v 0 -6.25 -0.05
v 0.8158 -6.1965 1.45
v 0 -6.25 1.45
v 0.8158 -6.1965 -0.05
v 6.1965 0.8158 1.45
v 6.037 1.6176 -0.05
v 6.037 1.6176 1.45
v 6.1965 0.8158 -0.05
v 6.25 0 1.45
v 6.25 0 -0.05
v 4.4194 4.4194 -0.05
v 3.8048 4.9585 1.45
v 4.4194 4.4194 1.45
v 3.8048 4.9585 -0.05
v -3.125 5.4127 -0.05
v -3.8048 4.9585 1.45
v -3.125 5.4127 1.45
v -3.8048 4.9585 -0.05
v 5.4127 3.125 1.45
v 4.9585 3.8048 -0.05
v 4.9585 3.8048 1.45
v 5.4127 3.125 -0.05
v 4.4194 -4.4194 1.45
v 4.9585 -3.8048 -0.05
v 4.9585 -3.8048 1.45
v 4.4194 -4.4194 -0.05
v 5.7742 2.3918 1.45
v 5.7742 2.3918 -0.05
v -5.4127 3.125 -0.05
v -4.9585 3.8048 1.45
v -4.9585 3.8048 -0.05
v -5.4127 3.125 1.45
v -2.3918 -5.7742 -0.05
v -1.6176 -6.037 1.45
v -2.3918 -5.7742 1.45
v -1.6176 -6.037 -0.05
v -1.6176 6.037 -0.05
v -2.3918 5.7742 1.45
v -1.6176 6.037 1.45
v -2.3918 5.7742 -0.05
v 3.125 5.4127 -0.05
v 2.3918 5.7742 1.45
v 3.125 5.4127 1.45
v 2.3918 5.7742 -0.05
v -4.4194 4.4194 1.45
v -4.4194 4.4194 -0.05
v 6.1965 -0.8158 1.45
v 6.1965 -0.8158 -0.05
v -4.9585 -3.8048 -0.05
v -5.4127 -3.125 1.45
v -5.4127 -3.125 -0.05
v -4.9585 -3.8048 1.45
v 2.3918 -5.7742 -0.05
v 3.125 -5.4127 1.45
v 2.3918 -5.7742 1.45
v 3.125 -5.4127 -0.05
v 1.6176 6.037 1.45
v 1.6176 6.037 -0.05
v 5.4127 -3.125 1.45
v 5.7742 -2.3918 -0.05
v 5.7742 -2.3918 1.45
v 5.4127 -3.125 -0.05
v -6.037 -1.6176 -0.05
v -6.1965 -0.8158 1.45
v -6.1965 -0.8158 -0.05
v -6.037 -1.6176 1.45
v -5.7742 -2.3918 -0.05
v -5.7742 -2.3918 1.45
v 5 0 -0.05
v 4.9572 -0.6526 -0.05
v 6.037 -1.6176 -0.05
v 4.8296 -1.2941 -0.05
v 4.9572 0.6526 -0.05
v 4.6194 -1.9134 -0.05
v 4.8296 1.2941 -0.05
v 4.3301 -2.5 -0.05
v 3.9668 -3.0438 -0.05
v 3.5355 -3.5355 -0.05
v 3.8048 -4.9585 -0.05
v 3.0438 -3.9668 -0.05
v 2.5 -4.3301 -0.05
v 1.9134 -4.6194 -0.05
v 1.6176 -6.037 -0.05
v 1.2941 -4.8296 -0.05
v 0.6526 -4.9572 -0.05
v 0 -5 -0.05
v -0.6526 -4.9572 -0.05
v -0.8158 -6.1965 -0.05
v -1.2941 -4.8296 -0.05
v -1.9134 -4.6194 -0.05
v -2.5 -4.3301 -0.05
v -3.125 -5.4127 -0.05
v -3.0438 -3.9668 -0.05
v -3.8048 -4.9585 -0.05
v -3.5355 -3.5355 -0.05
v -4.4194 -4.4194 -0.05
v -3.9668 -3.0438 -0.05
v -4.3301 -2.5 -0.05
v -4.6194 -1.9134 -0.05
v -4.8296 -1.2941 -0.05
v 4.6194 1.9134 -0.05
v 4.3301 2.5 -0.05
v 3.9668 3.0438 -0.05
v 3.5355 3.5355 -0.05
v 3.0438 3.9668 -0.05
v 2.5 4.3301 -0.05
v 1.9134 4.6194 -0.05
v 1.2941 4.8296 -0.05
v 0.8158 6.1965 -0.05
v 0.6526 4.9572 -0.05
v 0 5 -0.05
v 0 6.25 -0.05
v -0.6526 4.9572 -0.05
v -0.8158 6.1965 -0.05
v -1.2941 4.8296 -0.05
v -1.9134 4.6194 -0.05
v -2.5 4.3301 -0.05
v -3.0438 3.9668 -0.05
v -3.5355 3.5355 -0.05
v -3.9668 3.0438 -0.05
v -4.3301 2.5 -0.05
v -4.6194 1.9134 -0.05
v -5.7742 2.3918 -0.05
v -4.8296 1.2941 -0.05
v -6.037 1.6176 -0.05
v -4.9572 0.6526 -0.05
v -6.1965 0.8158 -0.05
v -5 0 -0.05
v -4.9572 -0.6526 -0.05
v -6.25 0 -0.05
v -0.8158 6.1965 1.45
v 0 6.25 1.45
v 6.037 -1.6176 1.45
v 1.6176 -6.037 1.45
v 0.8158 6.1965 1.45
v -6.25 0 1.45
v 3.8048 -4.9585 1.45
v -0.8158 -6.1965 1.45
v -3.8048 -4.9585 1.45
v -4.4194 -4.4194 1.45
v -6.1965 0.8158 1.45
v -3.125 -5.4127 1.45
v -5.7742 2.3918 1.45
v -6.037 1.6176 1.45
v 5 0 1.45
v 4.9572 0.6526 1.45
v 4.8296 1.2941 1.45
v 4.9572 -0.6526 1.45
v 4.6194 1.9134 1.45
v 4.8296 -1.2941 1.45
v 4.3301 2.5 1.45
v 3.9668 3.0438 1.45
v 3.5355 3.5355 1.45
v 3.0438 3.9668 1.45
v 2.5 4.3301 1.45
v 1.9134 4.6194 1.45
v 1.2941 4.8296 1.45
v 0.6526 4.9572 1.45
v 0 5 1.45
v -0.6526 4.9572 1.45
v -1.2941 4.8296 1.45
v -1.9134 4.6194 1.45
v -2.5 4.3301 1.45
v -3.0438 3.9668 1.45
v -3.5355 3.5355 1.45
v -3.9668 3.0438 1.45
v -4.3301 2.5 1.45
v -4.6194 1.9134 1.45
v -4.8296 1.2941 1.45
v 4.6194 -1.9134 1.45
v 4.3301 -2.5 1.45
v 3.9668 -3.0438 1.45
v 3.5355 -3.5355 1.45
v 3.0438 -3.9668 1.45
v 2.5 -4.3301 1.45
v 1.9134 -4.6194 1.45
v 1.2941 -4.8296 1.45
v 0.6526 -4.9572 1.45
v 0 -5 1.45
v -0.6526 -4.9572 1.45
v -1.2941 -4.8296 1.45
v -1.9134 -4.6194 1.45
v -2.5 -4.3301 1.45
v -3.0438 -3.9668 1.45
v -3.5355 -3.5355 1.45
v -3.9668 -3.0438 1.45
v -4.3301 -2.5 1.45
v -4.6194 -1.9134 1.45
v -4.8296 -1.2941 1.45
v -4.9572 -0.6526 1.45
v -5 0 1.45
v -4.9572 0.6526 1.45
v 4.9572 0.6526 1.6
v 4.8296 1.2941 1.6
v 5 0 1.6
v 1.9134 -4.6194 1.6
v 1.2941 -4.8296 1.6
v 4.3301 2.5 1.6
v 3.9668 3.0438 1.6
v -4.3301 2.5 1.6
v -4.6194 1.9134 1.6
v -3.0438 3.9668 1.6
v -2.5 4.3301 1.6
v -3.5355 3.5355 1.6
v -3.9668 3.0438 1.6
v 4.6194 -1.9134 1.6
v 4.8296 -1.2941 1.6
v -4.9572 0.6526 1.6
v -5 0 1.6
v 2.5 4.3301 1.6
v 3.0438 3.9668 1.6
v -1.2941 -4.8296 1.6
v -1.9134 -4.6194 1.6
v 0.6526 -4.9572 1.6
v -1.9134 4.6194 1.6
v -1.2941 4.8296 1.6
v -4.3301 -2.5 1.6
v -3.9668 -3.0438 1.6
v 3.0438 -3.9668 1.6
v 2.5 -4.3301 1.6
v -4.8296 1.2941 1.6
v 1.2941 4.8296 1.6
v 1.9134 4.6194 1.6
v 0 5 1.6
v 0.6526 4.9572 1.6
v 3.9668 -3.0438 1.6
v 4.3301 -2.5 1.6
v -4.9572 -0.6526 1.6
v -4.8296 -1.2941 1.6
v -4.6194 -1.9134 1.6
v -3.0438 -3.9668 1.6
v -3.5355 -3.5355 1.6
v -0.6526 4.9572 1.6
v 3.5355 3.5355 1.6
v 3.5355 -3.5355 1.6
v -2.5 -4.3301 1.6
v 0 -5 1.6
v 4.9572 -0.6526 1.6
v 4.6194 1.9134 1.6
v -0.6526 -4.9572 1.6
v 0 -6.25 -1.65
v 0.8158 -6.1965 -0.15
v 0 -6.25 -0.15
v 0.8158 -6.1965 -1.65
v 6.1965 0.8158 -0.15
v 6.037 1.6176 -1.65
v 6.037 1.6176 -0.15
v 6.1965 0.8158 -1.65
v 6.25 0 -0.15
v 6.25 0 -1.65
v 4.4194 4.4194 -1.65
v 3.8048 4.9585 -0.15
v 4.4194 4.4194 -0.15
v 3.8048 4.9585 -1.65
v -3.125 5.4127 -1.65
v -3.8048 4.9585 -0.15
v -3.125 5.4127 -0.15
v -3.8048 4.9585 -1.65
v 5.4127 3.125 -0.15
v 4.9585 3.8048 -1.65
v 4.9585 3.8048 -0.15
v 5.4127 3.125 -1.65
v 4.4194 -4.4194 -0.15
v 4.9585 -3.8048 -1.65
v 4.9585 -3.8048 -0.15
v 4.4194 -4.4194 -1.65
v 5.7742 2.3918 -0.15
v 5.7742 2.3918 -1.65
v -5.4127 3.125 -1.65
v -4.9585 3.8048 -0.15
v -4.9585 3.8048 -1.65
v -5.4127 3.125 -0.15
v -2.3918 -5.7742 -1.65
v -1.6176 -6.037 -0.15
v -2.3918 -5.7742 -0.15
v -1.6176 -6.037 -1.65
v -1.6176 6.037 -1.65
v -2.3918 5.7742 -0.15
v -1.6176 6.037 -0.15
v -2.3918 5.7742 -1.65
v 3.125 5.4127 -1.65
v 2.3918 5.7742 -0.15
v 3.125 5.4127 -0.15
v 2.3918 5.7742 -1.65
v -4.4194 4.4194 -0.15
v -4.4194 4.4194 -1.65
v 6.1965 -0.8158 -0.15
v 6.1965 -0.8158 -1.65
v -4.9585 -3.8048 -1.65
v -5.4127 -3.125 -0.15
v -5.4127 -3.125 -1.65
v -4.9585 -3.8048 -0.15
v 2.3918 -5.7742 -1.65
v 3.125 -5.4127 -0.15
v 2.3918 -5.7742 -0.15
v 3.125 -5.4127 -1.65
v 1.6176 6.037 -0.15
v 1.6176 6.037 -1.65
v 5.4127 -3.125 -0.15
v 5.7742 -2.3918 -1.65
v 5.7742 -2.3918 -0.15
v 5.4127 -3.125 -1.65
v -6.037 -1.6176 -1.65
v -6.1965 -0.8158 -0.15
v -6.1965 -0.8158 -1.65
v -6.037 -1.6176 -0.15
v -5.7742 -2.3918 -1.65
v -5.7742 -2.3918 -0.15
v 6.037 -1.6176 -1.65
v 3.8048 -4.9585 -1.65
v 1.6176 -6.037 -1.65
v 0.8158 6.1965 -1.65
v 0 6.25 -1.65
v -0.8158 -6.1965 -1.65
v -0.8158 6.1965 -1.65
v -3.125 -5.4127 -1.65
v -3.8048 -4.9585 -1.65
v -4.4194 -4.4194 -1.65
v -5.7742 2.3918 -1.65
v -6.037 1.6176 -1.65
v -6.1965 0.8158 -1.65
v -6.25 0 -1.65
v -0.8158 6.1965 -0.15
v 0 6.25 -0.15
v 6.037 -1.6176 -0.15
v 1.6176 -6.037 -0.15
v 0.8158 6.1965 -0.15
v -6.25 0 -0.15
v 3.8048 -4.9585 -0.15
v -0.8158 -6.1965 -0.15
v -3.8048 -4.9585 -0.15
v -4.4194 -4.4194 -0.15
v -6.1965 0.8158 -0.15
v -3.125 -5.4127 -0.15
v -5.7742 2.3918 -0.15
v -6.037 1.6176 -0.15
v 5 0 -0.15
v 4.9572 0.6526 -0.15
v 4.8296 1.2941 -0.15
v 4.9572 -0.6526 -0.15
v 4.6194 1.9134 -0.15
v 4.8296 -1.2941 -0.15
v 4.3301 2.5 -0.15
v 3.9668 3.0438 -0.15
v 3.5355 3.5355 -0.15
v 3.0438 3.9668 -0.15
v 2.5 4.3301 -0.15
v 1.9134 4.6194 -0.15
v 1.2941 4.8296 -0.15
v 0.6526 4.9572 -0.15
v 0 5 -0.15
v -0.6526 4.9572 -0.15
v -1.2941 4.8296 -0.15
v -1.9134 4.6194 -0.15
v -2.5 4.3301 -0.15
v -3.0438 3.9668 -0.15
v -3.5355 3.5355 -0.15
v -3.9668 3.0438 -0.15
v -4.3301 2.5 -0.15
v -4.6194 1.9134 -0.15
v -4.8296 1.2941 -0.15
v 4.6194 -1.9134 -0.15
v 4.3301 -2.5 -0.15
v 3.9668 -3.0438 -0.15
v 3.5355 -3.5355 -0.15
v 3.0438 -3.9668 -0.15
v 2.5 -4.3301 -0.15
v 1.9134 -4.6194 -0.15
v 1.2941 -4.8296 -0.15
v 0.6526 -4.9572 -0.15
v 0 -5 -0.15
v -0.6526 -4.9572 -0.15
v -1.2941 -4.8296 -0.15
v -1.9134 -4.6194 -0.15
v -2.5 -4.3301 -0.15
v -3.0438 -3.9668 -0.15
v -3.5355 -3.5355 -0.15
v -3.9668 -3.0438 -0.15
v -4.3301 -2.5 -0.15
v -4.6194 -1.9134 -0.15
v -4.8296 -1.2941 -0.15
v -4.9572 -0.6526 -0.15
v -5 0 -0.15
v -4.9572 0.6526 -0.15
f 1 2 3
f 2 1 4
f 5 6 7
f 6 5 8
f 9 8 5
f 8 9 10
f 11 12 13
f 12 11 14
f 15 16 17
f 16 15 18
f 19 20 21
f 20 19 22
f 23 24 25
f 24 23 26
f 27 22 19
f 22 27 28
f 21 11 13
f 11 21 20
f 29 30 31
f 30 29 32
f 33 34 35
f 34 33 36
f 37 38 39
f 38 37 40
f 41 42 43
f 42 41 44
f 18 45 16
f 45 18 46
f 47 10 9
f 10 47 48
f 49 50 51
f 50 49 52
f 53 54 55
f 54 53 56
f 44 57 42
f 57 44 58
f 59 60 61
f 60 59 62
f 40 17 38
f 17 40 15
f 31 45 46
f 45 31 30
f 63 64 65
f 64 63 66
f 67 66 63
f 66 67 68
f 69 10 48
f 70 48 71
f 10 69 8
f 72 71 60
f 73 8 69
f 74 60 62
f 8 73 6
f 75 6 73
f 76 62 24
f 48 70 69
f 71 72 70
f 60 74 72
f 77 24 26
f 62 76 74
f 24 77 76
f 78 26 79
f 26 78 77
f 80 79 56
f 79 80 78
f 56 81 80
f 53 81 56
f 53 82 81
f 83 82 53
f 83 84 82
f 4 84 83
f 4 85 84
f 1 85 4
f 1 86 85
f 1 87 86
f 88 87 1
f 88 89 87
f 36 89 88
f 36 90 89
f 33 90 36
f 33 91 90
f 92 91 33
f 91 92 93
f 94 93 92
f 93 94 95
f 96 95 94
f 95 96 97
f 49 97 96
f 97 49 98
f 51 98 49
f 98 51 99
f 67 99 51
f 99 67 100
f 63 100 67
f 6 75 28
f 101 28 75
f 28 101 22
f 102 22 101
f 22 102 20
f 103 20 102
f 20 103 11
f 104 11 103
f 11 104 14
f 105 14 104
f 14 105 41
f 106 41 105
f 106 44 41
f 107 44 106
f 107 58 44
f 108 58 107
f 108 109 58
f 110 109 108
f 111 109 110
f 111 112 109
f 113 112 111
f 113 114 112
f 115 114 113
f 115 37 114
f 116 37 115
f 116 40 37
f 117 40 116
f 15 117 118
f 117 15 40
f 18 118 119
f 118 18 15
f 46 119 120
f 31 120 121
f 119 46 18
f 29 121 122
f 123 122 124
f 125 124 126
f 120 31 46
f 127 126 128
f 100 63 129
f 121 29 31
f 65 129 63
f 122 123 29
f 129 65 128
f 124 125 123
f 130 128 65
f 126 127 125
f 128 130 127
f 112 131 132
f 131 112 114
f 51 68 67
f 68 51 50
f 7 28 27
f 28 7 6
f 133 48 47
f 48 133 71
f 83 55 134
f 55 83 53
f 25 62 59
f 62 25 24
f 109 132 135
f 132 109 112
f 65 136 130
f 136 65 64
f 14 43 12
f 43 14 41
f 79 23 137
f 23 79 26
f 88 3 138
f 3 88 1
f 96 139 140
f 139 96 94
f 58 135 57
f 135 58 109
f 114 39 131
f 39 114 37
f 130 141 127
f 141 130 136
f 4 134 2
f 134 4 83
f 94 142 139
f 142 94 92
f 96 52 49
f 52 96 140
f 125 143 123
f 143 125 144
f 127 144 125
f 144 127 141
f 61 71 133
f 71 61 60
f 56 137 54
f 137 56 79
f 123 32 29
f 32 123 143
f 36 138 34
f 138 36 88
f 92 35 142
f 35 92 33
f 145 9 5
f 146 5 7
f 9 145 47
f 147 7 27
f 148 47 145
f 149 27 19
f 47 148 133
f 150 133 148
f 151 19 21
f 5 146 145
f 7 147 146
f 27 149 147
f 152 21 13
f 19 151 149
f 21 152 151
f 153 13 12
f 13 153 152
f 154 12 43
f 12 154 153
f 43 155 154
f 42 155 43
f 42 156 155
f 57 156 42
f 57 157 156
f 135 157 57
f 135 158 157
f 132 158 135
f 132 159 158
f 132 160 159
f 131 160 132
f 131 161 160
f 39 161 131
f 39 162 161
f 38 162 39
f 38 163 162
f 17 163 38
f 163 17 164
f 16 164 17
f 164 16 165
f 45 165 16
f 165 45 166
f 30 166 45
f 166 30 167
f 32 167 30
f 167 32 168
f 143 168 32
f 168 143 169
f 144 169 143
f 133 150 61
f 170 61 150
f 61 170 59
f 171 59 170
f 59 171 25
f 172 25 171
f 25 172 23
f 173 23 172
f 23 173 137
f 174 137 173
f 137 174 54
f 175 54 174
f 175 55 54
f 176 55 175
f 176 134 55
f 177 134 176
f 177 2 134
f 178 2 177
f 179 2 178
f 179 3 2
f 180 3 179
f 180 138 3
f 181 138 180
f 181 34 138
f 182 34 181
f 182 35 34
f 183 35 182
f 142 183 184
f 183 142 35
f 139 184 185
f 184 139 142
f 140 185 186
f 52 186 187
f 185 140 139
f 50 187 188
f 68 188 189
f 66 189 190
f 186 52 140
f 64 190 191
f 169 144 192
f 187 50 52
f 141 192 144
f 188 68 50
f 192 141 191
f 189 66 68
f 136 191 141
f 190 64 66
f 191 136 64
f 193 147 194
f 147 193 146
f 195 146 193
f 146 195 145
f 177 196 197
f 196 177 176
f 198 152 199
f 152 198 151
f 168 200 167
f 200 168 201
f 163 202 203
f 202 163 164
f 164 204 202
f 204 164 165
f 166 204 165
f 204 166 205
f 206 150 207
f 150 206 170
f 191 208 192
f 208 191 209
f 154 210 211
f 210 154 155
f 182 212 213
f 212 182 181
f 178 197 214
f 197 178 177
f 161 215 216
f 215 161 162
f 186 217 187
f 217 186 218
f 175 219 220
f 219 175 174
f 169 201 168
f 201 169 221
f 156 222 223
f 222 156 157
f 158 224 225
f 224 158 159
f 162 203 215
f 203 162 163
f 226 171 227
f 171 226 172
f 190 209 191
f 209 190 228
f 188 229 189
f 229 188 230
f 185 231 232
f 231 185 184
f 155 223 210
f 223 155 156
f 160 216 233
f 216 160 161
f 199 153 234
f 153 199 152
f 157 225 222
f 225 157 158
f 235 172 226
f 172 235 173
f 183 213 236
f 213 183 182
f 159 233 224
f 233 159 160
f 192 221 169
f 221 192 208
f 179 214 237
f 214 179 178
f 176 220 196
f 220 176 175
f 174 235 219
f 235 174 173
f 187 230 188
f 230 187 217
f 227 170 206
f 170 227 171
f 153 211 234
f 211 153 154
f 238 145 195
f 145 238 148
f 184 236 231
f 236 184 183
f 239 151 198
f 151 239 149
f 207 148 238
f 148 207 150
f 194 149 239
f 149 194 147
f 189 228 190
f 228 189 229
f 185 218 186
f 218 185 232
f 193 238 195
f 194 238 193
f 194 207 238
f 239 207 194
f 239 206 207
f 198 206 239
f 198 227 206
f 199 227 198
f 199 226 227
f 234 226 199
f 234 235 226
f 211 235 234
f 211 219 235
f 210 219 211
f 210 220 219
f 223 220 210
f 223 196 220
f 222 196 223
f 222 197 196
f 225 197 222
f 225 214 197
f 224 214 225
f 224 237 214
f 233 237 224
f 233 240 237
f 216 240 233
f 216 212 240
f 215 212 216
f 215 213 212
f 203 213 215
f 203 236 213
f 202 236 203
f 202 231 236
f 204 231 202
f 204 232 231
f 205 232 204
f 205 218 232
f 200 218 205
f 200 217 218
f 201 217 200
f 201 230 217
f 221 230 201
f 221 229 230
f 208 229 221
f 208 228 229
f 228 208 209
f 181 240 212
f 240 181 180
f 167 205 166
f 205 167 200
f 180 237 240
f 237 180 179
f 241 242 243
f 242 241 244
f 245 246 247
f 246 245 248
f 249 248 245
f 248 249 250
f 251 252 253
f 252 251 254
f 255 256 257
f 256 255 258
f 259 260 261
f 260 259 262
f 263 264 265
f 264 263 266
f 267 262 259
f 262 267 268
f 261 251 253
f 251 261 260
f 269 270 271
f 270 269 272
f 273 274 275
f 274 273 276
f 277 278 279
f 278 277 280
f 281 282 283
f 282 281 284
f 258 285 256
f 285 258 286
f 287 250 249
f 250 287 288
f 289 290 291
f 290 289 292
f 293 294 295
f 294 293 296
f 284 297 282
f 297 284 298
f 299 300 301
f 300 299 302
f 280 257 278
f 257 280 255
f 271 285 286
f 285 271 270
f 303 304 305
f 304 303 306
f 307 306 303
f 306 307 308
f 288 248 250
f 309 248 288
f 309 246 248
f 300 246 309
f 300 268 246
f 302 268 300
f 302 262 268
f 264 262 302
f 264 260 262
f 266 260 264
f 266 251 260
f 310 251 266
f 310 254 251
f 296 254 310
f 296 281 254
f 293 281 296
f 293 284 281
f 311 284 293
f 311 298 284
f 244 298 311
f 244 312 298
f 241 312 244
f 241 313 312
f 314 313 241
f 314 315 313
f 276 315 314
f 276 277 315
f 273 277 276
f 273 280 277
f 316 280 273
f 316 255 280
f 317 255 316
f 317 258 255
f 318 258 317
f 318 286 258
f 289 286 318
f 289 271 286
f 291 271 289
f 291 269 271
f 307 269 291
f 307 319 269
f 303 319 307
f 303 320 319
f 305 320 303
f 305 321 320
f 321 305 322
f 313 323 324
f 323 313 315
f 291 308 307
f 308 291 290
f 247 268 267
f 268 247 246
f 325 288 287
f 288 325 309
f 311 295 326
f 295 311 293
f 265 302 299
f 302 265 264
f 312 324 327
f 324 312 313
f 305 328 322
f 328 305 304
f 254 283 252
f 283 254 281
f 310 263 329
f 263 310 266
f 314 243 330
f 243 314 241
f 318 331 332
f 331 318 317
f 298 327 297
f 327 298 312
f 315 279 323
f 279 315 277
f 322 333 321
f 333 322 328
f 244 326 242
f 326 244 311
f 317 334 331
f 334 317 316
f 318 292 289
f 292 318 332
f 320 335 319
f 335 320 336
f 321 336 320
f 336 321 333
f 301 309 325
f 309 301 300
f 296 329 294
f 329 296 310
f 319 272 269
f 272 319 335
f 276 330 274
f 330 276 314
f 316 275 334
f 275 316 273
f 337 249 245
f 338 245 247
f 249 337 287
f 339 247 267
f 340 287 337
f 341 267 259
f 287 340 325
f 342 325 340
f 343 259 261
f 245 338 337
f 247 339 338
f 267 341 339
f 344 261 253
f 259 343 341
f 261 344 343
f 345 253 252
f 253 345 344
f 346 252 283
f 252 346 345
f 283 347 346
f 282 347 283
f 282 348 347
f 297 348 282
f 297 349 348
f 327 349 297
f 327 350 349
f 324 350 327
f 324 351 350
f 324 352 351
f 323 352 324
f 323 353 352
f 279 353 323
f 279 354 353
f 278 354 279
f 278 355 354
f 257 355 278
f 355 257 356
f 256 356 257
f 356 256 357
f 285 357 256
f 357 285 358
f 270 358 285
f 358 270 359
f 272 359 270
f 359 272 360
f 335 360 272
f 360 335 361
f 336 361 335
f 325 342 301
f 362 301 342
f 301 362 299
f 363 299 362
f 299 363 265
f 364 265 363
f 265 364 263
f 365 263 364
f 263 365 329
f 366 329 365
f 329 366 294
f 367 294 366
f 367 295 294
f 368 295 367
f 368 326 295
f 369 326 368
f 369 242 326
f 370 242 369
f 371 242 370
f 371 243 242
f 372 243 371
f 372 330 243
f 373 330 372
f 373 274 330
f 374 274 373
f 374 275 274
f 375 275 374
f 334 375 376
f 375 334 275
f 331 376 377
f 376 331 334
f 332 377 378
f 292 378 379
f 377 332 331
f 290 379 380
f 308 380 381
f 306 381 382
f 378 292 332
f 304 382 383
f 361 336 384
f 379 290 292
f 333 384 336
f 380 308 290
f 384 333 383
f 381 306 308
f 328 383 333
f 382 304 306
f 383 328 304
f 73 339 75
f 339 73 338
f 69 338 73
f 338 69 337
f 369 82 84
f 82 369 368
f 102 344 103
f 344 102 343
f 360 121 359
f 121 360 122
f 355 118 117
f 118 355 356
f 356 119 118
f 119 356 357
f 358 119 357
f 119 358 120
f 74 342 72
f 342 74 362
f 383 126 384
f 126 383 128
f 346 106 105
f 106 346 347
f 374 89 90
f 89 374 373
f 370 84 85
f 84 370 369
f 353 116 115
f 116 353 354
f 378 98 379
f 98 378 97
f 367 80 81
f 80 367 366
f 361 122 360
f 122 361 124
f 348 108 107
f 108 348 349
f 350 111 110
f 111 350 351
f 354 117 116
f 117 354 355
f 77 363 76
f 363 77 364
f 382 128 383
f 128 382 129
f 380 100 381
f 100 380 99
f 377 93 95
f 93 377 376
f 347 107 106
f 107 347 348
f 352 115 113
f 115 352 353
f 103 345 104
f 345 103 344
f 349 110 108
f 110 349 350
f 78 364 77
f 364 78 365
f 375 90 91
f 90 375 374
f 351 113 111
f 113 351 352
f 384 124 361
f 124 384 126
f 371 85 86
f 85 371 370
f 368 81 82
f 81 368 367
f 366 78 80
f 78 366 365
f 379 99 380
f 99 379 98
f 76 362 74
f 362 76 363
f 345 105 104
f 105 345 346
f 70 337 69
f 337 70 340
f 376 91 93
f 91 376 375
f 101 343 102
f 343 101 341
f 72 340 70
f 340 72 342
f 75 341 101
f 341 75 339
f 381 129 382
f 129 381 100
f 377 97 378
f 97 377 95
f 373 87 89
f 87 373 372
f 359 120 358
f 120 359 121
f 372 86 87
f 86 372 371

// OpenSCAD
$fn = 48;

union() {
	translate(v = [0, 0, 0.8000000000]) {
		color(c = [0.4500000000, 0.4300000000, 0.5000000000]) {
			union() {
				translate(v = [0, 0, -0.1000000000]) {
					cylinder(center = true, h = 1.5000000000, r = 6.2500000000);
				}
				cylinder(center = true, h = 1.6000000000, r = 5.0000000000);
			}
		}
	}
	translate(v = [0, 0, -0.8000000000]) {
		color(c = [0.4500000000, 0.4300000000, 0.5000000000]) {
			union() {
				translate(v = [0, 0, -0.1000000000]) {
					cylinder(center = true, h = 1.5000000000, r = 6.2500000000);
				}
				cylinder(center = true, h = 1.6000000000, r = 5.0000000000);
			}
		}
	}
}
/***********************************************
******      SolidPython code:      *************
************************************************
 
#! /usr/bin/env python
# -*- coding: UTF-8 -*-
from __future__ import division
import os, sys, re

from solid import *
from solid.utils import *

SEGMENTS = 48


def battery_cr1216():
    base = down(0.1)(cylinder( r=12.5/2, h=1.6-0.1, center=True))
    top = cylinder( r=10/2, h=1.6, center=True)
    cr1216 = base + top
    return  color(Stainless)(cr1216)

def two_battery_cr1216():
    # Should have a nice loop here
    # Quick and dirty...
    return up(1.6/2)(battery_cr1216()) + down(1.6/2)(battery_cr1216())



if __name__ == '__main__':    
    out_dir = sys.argv[1] if len(sys.argv) > 1 else os.curdir
    file_out = os.path.join( out_dir, 'case.scad')
    
    a = two_battery_cr1216()
    
    print("%(__file__)s: SCAD file written to: \n%(file_out)s"%vars())
    
    # Adding the file_header argument as shown allows you to change
    # the detail of arcs by changing the SEGMENTS variable.  This can 
    # be expensive when making lots of small curves, but is otherwise
    # useful.
    scad_render_to_file( a, file_out, file_header='$fn = %s;'%SEGMENTS) 
 
 
***********************************************/
